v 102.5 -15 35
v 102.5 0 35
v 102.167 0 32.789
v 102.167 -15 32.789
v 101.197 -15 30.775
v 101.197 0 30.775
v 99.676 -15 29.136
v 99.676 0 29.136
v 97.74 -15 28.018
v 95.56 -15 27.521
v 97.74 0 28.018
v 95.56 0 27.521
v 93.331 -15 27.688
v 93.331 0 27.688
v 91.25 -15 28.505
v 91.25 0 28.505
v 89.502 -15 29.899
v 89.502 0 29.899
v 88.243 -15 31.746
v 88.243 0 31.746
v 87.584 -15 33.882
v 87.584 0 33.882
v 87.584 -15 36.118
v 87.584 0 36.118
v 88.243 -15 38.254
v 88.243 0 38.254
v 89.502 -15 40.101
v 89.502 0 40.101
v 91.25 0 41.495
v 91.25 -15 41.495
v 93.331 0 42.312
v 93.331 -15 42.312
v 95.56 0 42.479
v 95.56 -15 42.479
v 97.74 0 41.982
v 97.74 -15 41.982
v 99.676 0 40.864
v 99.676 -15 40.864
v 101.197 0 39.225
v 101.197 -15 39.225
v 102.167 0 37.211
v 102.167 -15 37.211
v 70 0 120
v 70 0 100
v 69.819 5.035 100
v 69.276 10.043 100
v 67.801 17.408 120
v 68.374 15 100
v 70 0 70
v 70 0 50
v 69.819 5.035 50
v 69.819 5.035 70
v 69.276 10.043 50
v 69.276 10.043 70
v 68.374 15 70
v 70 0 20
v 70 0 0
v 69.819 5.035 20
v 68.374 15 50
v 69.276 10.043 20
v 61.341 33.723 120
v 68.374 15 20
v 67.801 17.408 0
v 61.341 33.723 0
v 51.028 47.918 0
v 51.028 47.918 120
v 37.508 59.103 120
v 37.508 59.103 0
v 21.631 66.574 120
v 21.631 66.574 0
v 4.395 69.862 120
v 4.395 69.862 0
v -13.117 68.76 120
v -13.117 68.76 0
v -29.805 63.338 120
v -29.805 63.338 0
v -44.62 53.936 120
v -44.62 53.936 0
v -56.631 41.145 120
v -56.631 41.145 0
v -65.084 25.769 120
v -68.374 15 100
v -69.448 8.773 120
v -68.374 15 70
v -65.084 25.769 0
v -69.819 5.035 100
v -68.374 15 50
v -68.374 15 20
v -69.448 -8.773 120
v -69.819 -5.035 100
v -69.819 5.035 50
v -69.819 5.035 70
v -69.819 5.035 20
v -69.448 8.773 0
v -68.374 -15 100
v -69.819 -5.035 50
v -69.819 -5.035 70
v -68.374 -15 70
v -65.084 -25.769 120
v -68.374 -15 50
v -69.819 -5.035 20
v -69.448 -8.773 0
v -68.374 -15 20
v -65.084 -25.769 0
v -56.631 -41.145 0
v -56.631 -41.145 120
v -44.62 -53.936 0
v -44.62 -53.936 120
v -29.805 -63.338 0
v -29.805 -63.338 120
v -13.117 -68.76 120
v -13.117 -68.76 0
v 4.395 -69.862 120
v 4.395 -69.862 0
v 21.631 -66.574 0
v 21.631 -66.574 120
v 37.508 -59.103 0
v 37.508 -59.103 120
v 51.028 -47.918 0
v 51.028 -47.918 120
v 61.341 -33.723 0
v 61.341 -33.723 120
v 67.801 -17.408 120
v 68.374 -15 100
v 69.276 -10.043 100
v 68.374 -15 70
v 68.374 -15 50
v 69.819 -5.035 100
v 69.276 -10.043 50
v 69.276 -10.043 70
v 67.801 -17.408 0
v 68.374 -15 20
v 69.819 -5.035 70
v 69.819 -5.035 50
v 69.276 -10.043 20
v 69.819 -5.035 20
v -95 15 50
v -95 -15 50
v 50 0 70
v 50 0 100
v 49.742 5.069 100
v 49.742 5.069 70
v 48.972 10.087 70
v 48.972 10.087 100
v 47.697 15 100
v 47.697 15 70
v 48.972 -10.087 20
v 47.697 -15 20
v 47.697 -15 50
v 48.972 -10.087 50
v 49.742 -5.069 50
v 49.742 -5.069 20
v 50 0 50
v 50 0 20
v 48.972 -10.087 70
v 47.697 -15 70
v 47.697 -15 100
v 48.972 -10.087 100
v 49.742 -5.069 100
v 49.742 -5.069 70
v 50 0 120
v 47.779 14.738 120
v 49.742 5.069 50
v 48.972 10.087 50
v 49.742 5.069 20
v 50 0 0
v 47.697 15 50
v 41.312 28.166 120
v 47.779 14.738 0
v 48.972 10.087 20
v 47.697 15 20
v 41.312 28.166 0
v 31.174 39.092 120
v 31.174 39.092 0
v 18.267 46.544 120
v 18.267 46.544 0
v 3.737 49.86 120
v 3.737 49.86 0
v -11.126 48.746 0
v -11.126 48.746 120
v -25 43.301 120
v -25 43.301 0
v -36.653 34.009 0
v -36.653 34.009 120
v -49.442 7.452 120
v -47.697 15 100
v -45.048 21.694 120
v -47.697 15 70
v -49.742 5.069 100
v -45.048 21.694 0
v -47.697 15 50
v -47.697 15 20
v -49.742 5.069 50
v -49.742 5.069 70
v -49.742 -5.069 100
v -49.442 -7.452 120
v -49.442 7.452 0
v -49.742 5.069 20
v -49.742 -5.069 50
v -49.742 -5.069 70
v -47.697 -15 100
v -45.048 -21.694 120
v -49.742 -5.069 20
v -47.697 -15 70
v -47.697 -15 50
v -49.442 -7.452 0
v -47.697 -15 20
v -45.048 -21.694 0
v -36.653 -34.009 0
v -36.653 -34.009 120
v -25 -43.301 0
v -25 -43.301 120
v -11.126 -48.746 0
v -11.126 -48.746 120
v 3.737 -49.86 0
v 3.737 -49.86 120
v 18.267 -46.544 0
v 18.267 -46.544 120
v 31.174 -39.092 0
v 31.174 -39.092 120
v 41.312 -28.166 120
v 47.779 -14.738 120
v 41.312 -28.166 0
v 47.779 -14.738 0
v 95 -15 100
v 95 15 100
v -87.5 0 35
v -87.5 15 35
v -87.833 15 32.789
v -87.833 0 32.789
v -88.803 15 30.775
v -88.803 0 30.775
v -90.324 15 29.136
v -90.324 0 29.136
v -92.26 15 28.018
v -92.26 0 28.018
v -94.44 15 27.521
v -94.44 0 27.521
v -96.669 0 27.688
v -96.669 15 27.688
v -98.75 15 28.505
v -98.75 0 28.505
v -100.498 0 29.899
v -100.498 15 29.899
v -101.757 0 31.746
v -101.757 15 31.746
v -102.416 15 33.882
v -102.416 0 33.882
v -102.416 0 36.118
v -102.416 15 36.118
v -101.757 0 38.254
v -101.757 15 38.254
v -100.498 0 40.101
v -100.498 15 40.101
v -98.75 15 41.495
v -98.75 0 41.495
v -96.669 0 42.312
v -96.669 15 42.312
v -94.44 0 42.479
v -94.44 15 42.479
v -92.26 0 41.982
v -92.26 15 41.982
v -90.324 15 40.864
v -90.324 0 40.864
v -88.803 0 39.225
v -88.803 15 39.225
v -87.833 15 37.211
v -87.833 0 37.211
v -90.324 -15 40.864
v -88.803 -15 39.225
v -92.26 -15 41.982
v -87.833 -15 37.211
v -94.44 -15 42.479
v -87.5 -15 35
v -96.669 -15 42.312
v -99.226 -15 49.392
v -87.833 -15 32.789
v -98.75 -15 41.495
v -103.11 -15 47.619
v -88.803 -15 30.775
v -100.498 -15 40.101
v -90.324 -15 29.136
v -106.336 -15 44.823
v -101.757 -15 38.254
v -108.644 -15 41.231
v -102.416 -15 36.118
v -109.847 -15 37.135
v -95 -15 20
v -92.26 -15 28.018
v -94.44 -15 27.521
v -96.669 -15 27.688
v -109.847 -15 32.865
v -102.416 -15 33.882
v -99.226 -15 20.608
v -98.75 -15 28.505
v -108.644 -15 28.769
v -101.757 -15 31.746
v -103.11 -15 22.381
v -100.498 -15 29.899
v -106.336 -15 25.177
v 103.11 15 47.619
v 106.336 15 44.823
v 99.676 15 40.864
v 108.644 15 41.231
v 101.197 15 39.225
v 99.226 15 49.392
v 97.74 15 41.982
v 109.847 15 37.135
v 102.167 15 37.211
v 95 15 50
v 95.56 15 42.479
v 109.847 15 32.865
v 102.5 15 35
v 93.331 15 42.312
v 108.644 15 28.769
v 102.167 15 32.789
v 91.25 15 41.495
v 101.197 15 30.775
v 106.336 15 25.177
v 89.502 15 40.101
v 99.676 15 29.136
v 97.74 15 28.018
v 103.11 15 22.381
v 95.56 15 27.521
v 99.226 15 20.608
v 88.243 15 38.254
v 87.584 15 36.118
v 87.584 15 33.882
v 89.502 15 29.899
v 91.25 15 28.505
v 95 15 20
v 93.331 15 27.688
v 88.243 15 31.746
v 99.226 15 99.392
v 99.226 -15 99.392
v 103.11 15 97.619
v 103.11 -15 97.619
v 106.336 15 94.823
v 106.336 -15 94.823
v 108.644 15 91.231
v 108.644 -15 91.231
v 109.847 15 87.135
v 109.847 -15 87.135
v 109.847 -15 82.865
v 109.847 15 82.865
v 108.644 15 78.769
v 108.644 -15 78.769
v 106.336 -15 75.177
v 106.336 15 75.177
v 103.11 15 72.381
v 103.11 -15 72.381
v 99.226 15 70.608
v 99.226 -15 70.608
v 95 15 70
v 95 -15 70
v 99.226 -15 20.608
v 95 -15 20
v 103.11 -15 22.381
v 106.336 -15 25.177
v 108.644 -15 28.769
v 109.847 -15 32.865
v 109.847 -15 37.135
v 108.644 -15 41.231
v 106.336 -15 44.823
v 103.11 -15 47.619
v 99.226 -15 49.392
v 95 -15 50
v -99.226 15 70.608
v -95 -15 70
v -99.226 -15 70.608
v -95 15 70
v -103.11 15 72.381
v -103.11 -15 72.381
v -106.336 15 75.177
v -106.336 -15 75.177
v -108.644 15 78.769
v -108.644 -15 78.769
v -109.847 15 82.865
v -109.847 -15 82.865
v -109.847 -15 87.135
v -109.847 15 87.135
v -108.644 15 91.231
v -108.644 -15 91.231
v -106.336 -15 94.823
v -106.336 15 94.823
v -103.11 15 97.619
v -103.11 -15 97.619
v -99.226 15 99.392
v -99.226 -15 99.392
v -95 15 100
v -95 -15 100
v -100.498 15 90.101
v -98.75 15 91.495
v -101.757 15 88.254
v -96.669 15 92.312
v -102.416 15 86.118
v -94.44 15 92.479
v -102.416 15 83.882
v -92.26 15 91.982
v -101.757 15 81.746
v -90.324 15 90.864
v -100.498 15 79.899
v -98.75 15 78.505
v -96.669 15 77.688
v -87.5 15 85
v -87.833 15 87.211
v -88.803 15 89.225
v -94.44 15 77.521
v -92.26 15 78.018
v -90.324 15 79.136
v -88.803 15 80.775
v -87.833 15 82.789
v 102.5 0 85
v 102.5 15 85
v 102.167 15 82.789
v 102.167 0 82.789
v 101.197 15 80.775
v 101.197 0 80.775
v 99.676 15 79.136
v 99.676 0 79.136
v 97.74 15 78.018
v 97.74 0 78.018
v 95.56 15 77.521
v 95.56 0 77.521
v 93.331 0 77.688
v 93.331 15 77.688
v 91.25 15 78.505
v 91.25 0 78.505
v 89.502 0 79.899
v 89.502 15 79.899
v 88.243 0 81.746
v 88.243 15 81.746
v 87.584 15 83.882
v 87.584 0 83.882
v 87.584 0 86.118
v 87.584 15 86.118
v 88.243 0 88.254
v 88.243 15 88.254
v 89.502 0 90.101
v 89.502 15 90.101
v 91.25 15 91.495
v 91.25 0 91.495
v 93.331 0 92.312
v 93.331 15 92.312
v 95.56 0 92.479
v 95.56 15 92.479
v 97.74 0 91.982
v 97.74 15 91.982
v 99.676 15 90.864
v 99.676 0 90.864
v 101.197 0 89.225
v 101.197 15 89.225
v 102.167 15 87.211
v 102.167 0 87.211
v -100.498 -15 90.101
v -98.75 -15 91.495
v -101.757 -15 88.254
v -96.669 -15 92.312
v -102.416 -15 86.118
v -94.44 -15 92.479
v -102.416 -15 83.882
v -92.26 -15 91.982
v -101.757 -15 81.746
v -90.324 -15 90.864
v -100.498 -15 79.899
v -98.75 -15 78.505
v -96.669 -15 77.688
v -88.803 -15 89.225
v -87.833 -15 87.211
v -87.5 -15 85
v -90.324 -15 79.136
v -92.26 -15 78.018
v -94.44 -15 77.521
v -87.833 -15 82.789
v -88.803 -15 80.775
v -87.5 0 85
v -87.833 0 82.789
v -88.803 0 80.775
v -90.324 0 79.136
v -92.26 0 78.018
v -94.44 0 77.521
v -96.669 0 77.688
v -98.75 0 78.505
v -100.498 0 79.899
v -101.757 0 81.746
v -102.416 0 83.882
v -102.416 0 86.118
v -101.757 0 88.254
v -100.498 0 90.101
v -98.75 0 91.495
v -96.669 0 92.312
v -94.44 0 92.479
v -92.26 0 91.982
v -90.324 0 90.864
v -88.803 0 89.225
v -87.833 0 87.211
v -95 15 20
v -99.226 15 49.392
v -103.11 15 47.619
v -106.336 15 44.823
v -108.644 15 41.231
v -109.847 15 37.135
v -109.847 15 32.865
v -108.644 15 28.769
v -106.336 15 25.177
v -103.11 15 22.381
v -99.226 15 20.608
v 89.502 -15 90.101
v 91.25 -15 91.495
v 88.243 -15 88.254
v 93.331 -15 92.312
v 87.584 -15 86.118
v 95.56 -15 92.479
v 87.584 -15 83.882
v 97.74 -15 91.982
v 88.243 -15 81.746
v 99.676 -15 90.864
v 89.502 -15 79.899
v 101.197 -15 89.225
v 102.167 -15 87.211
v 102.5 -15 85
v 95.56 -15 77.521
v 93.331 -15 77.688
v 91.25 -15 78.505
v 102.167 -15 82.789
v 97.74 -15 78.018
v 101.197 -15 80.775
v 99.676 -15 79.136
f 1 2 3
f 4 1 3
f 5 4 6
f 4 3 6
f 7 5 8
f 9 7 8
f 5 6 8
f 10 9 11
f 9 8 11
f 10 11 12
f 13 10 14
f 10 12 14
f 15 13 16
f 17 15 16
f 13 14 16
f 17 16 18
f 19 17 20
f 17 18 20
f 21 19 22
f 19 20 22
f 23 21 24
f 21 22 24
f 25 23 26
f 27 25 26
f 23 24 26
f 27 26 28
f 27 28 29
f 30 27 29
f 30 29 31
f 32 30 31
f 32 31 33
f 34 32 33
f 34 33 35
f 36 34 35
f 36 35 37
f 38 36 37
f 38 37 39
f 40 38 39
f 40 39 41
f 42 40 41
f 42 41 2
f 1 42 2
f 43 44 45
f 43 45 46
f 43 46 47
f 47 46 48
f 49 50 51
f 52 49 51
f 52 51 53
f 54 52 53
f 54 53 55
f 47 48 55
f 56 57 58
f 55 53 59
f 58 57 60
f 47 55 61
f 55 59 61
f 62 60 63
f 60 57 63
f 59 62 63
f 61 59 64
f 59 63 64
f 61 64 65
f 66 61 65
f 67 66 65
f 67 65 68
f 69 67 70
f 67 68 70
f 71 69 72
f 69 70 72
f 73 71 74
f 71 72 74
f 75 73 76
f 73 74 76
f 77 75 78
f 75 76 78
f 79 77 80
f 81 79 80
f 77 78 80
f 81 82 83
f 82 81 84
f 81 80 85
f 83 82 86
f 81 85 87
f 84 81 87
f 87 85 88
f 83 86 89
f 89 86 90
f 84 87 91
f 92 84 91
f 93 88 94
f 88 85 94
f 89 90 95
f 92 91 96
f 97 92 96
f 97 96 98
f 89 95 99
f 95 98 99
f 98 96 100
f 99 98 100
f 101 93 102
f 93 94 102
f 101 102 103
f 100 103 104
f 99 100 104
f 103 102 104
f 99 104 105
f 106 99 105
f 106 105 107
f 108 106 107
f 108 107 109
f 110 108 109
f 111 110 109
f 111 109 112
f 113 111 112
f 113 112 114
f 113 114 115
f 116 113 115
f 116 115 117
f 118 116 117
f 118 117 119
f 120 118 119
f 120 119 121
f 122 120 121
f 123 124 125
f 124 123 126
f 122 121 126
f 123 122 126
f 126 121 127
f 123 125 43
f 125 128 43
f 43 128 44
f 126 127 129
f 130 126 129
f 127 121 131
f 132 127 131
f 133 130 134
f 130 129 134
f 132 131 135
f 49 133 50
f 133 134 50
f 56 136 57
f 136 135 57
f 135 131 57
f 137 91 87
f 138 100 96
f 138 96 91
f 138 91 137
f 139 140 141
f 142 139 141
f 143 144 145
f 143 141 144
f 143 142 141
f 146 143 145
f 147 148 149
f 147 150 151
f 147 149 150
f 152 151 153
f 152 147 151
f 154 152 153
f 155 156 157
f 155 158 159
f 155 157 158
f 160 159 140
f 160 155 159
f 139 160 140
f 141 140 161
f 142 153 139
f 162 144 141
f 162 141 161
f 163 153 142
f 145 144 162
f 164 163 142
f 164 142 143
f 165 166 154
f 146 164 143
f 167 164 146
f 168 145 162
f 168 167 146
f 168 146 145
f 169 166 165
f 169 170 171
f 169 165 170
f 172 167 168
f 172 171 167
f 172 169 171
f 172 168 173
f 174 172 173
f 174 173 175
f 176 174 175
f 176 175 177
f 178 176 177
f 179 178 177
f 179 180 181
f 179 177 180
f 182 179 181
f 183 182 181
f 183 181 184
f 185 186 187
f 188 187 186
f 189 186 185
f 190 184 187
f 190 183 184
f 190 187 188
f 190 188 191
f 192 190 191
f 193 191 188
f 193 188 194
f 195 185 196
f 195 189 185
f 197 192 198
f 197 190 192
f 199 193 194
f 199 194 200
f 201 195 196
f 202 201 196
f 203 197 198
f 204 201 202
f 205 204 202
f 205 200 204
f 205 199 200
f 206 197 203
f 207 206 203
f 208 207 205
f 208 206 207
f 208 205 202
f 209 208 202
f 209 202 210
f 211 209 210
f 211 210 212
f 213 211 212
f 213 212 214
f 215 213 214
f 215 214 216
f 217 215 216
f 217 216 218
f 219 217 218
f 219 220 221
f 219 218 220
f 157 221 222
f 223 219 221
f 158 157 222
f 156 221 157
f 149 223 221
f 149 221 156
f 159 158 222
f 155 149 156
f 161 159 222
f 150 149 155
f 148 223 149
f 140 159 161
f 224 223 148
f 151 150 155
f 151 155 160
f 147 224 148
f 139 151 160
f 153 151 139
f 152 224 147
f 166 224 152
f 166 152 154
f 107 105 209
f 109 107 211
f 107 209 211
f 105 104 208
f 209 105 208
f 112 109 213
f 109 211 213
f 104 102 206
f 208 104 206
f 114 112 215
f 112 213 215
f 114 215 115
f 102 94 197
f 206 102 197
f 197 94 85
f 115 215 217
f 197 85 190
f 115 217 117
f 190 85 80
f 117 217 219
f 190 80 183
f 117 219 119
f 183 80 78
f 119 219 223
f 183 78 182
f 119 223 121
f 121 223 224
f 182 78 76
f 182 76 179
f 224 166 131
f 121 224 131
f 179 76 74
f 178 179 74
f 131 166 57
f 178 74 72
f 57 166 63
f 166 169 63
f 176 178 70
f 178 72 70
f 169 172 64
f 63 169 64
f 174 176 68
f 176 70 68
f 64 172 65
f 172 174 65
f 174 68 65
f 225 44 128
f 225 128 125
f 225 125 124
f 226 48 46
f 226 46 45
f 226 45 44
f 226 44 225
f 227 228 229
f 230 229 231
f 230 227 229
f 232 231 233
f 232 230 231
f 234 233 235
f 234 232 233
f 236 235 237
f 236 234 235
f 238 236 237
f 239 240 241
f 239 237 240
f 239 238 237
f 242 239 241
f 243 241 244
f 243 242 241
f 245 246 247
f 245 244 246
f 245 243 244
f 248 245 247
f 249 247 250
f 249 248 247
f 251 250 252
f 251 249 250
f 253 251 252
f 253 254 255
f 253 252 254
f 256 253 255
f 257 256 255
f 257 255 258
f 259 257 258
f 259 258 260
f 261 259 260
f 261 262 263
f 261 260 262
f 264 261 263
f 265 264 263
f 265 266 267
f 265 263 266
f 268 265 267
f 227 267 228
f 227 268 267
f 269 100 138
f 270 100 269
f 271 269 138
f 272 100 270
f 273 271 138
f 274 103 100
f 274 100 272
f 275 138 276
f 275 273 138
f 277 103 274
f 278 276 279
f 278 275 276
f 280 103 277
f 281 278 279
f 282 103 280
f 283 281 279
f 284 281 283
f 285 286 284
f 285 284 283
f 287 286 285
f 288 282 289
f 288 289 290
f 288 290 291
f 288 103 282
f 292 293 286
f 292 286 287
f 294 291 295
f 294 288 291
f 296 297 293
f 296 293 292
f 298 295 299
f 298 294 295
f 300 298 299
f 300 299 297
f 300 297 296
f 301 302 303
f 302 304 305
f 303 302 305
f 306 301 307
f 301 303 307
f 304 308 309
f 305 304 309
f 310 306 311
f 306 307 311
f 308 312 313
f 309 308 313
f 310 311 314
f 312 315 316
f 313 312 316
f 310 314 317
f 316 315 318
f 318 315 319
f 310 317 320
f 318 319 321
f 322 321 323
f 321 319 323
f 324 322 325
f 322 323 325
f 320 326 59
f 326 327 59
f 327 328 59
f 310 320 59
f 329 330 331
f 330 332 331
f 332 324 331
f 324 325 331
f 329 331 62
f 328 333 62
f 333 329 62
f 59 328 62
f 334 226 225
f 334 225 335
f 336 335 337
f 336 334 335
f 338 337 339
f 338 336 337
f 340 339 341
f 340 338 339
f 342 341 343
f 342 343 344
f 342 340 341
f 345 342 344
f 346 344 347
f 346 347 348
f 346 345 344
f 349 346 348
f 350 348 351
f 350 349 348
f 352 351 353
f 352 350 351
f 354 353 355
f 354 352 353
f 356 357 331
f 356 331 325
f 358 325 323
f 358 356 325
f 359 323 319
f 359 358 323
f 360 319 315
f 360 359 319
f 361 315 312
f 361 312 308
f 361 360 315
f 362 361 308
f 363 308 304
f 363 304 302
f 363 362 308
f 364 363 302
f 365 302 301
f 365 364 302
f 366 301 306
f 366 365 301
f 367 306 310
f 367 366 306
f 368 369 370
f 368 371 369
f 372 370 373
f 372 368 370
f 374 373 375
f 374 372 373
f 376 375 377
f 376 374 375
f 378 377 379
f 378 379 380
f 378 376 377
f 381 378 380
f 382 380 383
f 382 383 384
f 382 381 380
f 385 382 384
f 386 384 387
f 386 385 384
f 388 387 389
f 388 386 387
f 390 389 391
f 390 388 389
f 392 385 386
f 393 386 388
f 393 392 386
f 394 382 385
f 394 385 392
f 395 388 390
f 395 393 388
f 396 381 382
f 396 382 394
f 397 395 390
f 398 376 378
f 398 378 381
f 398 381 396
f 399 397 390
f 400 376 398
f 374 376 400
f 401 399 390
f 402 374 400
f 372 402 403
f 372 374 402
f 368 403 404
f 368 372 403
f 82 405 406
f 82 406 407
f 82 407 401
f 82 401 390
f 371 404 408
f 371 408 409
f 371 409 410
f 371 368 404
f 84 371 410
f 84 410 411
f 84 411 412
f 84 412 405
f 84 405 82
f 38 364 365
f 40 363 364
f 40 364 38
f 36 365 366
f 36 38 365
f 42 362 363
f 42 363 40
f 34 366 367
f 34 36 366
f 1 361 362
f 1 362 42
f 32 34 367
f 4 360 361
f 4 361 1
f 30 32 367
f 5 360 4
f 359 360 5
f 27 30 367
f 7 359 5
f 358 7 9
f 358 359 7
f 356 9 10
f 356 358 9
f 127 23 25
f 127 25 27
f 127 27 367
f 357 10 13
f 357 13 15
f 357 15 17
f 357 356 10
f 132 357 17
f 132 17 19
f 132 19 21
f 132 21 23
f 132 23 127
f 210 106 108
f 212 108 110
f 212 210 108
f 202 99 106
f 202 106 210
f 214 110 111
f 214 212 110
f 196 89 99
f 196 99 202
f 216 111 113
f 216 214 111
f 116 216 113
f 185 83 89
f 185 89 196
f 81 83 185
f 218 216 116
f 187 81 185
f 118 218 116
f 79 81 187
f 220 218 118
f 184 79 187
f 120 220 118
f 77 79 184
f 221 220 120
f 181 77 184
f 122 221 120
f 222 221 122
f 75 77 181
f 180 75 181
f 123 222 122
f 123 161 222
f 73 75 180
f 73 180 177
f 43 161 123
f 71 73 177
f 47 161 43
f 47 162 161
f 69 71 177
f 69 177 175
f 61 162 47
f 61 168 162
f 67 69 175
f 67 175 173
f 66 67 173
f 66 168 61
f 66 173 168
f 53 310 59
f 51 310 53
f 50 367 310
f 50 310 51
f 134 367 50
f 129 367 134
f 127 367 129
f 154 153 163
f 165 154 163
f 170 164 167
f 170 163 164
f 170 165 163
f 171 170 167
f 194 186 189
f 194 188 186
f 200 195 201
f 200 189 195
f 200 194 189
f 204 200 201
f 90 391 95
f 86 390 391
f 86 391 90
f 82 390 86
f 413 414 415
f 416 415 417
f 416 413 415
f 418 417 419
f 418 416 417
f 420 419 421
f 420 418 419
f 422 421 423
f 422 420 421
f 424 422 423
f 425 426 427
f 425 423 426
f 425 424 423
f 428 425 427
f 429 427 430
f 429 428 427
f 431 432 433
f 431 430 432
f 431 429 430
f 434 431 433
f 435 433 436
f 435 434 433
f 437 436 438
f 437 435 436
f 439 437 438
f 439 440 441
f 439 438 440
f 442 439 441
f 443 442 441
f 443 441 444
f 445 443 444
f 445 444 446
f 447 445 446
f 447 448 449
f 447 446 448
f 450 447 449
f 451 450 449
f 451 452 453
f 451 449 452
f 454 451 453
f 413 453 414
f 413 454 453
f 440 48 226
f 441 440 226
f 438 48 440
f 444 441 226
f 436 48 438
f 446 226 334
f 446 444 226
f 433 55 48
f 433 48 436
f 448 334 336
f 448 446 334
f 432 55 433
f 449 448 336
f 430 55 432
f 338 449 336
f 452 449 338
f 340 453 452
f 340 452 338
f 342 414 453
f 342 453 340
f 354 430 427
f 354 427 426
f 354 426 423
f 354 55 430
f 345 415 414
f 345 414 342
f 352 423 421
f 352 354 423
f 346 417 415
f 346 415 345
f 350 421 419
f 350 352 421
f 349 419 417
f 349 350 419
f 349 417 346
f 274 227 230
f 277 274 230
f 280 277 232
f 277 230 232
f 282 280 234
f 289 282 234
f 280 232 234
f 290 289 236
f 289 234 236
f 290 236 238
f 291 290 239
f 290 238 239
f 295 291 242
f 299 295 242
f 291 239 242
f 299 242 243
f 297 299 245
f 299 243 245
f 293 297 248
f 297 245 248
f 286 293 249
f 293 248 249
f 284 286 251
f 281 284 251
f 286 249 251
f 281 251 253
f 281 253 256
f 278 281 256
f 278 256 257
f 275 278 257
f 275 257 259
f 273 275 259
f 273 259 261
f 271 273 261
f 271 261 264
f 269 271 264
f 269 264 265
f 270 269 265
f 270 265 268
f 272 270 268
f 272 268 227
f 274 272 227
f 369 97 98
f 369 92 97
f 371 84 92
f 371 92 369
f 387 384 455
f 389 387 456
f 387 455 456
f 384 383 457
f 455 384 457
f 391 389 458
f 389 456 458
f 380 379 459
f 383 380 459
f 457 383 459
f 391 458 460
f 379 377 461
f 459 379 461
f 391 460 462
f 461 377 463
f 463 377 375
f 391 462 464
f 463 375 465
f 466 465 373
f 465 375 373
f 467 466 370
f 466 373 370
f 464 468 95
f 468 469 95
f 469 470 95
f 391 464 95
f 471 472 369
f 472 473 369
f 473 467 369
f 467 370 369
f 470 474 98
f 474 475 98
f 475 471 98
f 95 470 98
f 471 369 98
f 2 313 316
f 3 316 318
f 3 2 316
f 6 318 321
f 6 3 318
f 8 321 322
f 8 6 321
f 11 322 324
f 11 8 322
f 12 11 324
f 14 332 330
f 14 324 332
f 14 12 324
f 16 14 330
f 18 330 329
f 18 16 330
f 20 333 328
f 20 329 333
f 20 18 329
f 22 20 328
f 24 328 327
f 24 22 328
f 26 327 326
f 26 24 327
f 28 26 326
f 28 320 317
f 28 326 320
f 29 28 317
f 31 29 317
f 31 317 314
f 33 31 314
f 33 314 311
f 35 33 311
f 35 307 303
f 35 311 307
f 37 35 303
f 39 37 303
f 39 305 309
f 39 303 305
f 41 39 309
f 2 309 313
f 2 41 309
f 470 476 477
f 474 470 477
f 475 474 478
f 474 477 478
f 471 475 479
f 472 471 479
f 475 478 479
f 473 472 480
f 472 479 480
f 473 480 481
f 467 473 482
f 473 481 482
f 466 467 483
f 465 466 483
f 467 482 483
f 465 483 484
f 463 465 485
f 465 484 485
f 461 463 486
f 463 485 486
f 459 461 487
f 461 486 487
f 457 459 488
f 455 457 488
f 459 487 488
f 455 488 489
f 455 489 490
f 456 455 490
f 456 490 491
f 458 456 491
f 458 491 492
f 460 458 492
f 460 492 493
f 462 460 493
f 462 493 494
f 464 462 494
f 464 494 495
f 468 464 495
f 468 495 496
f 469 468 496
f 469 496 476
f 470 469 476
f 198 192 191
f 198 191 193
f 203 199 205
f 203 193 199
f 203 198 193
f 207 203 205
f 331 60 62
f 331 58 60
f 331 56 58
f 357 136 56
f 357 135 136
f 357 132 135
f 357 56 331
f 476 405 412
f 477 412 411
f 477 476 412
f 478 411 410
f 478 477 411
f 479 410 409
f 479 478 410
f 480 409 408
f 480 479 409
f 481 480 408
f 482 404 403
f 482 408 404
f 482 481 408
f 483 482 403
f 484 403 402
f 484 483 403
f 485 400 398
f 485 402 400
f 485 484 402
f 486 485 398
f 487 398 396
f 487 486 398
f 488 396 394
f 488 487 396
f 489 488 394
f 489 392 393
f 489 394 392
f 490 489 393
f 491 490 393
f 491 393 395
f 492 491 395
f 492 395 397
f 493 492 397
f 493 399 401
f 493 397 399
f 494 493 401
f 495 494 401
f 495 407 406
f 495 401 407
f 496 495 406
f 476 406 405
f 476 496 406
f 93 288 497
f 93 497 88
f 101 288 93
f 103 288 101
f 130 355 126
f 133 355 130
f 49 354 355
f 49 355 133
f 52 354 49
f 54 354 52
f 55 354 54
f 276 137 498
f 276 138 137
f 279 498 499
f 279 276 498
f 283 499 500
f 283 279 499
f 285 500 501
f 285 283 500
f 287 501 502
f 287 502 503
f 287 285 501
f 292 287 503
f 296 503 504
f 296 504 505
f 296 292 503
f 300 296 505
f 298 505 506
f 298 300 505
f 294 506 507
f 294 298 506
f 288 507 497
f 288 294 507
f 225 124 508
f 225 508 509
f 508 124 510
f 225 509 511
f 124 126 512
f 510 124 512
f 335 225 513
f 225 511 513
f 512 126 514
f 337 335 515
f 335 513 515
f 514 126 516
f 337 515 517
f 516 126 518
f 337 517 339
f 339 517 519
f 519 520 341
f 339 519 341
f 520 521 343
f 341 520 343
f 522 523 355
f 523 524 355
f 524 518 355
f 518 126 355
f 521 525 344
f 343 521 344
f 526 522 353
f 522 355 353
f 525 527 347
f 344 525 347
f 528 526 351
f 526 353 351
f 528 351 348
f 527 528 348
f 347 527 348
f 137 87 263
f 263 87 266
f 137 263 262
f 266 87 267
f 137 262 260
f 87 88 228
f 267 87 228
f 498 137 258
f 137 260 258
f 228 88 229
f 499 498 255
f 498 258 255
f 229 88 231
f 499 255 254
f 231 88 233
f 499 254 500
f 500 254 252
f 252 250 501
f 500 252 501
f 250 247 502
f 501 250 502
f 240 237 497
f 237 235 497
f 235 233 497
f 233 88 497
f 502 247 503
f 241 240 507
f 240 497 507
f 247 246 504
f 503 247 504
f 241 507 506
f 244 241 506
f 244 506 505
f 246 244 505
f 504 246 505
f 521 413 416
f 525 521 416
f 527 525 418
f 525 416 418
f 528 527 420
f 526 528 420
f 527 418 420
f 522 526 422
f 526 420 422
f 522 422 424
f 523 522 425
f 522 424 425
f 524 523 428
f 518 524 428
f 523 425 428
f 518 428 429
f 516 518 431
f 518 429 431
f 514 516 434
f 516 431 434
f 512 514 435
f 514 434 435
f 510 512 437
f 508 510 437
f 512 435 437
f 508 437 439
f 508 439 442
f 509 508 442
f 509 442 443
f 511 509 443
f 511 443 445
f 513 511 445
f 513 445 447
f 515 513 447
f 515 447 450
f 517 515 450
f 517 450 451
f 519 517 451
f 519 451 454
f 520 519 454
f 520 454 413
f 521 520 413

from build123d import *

# Parameters (mm, degrees)
SKETCH_1_R               = 70
EXTRUDE_1_DEPTH          = 120
SKETCH_3_R               = 50
CUT_EXTRUDE_1_DEPTH      = 121
EXTRUDE_2_DEPTH          = 15
SKETCH_5_R               = 7.5
CUT_EXTRUDE_2_DEPTH      = 71
CUT_EXTRUDE_2_DEPTH_BACK = 71
SKETCH_6_R               = 50
CUT_EXTRUDE_3_DEPTH      = 121


with BuildPart() as part:
    # 스케치1 → 보스-돌출1 (new body)
    with BuildSketch(Plane.XY):
        Circle(SKETCH_1_R)
    extrude(amount=EXTRUDE_1_DEPTH)

    # 스케치3 → 컷-돌출1 (cut, through all)
    with BuildSketch(Plane.XY):
        Circle(SKETCH_3_R)
    extrude(amount=CUT_EXTRUDE_1_DEPTH, mode=Mode.SUBTRACT)

    # 스케치4 → 보스-돌출2 (add, symmetric)
    with BuildSketch(Plane(origin=(0, 0, 0), x_dir=(1, 0, 0), z_dir=(0, 1, 0))):
        with BuildLine():
            Line((-95, -20), (95, -20))
            ThreePointArc((95, -20), (110, -35), (95, -50))
            Line((95, -50), (-95, -50))
            ThreePointArc((-95, -50), (-110, -35), (-95, -20))
        make_face()
        with BuildLine():
            Line((-95, -100), (95, -100))
            ThreePointArc((95, -100), (110, -85), (95, -70))
            Line((95, -70), (-95, -70))
            ThreePointArc((-95, -70), (-110, -85), (-95, -100))
        make_face()
    extrude(amount=EXTRUDE_2_DEPTH, both=True)

    # 스케치5 → 컷-돌출2 (cut, two sides)
    with BuildSketch(Plane(origin=(0, 0, 0), x_dir=(1, 0, 0), z_dir=(0, 1, 0))) as cut_extrude_2_sk:
        with Locations((95, -35)):
            Circle(SKETCH_5_R)
        with Locations((95, -85)):
            Circle(SKETCH_5_R)
        with Locations((-95, -35)):
            Circle(SKETCH_5_R)
        with Locations((-95, -85)):
            Circle(SKETCH_5_R)
    extrude(amount=CUT_EXTRUDE_2_DEPTH, mode=Mode.SUBTRACT)
    extrude(cut_extrude_2_sk.sketch, amount=-CUT_EXTRUDE_2_DEPTH_BACK, mode=Mode.SUBTRACT)

    # 스케치6 → 컷-돌출3 (cut, through all)
    with BuildSketch(Plane.XY):
        Circle(SKETCH_6_R)
    extrude(amount=CUT_EXTRUDE_3_DEPTH, mode=Mode.SUBTRACT)


solid = part.part
